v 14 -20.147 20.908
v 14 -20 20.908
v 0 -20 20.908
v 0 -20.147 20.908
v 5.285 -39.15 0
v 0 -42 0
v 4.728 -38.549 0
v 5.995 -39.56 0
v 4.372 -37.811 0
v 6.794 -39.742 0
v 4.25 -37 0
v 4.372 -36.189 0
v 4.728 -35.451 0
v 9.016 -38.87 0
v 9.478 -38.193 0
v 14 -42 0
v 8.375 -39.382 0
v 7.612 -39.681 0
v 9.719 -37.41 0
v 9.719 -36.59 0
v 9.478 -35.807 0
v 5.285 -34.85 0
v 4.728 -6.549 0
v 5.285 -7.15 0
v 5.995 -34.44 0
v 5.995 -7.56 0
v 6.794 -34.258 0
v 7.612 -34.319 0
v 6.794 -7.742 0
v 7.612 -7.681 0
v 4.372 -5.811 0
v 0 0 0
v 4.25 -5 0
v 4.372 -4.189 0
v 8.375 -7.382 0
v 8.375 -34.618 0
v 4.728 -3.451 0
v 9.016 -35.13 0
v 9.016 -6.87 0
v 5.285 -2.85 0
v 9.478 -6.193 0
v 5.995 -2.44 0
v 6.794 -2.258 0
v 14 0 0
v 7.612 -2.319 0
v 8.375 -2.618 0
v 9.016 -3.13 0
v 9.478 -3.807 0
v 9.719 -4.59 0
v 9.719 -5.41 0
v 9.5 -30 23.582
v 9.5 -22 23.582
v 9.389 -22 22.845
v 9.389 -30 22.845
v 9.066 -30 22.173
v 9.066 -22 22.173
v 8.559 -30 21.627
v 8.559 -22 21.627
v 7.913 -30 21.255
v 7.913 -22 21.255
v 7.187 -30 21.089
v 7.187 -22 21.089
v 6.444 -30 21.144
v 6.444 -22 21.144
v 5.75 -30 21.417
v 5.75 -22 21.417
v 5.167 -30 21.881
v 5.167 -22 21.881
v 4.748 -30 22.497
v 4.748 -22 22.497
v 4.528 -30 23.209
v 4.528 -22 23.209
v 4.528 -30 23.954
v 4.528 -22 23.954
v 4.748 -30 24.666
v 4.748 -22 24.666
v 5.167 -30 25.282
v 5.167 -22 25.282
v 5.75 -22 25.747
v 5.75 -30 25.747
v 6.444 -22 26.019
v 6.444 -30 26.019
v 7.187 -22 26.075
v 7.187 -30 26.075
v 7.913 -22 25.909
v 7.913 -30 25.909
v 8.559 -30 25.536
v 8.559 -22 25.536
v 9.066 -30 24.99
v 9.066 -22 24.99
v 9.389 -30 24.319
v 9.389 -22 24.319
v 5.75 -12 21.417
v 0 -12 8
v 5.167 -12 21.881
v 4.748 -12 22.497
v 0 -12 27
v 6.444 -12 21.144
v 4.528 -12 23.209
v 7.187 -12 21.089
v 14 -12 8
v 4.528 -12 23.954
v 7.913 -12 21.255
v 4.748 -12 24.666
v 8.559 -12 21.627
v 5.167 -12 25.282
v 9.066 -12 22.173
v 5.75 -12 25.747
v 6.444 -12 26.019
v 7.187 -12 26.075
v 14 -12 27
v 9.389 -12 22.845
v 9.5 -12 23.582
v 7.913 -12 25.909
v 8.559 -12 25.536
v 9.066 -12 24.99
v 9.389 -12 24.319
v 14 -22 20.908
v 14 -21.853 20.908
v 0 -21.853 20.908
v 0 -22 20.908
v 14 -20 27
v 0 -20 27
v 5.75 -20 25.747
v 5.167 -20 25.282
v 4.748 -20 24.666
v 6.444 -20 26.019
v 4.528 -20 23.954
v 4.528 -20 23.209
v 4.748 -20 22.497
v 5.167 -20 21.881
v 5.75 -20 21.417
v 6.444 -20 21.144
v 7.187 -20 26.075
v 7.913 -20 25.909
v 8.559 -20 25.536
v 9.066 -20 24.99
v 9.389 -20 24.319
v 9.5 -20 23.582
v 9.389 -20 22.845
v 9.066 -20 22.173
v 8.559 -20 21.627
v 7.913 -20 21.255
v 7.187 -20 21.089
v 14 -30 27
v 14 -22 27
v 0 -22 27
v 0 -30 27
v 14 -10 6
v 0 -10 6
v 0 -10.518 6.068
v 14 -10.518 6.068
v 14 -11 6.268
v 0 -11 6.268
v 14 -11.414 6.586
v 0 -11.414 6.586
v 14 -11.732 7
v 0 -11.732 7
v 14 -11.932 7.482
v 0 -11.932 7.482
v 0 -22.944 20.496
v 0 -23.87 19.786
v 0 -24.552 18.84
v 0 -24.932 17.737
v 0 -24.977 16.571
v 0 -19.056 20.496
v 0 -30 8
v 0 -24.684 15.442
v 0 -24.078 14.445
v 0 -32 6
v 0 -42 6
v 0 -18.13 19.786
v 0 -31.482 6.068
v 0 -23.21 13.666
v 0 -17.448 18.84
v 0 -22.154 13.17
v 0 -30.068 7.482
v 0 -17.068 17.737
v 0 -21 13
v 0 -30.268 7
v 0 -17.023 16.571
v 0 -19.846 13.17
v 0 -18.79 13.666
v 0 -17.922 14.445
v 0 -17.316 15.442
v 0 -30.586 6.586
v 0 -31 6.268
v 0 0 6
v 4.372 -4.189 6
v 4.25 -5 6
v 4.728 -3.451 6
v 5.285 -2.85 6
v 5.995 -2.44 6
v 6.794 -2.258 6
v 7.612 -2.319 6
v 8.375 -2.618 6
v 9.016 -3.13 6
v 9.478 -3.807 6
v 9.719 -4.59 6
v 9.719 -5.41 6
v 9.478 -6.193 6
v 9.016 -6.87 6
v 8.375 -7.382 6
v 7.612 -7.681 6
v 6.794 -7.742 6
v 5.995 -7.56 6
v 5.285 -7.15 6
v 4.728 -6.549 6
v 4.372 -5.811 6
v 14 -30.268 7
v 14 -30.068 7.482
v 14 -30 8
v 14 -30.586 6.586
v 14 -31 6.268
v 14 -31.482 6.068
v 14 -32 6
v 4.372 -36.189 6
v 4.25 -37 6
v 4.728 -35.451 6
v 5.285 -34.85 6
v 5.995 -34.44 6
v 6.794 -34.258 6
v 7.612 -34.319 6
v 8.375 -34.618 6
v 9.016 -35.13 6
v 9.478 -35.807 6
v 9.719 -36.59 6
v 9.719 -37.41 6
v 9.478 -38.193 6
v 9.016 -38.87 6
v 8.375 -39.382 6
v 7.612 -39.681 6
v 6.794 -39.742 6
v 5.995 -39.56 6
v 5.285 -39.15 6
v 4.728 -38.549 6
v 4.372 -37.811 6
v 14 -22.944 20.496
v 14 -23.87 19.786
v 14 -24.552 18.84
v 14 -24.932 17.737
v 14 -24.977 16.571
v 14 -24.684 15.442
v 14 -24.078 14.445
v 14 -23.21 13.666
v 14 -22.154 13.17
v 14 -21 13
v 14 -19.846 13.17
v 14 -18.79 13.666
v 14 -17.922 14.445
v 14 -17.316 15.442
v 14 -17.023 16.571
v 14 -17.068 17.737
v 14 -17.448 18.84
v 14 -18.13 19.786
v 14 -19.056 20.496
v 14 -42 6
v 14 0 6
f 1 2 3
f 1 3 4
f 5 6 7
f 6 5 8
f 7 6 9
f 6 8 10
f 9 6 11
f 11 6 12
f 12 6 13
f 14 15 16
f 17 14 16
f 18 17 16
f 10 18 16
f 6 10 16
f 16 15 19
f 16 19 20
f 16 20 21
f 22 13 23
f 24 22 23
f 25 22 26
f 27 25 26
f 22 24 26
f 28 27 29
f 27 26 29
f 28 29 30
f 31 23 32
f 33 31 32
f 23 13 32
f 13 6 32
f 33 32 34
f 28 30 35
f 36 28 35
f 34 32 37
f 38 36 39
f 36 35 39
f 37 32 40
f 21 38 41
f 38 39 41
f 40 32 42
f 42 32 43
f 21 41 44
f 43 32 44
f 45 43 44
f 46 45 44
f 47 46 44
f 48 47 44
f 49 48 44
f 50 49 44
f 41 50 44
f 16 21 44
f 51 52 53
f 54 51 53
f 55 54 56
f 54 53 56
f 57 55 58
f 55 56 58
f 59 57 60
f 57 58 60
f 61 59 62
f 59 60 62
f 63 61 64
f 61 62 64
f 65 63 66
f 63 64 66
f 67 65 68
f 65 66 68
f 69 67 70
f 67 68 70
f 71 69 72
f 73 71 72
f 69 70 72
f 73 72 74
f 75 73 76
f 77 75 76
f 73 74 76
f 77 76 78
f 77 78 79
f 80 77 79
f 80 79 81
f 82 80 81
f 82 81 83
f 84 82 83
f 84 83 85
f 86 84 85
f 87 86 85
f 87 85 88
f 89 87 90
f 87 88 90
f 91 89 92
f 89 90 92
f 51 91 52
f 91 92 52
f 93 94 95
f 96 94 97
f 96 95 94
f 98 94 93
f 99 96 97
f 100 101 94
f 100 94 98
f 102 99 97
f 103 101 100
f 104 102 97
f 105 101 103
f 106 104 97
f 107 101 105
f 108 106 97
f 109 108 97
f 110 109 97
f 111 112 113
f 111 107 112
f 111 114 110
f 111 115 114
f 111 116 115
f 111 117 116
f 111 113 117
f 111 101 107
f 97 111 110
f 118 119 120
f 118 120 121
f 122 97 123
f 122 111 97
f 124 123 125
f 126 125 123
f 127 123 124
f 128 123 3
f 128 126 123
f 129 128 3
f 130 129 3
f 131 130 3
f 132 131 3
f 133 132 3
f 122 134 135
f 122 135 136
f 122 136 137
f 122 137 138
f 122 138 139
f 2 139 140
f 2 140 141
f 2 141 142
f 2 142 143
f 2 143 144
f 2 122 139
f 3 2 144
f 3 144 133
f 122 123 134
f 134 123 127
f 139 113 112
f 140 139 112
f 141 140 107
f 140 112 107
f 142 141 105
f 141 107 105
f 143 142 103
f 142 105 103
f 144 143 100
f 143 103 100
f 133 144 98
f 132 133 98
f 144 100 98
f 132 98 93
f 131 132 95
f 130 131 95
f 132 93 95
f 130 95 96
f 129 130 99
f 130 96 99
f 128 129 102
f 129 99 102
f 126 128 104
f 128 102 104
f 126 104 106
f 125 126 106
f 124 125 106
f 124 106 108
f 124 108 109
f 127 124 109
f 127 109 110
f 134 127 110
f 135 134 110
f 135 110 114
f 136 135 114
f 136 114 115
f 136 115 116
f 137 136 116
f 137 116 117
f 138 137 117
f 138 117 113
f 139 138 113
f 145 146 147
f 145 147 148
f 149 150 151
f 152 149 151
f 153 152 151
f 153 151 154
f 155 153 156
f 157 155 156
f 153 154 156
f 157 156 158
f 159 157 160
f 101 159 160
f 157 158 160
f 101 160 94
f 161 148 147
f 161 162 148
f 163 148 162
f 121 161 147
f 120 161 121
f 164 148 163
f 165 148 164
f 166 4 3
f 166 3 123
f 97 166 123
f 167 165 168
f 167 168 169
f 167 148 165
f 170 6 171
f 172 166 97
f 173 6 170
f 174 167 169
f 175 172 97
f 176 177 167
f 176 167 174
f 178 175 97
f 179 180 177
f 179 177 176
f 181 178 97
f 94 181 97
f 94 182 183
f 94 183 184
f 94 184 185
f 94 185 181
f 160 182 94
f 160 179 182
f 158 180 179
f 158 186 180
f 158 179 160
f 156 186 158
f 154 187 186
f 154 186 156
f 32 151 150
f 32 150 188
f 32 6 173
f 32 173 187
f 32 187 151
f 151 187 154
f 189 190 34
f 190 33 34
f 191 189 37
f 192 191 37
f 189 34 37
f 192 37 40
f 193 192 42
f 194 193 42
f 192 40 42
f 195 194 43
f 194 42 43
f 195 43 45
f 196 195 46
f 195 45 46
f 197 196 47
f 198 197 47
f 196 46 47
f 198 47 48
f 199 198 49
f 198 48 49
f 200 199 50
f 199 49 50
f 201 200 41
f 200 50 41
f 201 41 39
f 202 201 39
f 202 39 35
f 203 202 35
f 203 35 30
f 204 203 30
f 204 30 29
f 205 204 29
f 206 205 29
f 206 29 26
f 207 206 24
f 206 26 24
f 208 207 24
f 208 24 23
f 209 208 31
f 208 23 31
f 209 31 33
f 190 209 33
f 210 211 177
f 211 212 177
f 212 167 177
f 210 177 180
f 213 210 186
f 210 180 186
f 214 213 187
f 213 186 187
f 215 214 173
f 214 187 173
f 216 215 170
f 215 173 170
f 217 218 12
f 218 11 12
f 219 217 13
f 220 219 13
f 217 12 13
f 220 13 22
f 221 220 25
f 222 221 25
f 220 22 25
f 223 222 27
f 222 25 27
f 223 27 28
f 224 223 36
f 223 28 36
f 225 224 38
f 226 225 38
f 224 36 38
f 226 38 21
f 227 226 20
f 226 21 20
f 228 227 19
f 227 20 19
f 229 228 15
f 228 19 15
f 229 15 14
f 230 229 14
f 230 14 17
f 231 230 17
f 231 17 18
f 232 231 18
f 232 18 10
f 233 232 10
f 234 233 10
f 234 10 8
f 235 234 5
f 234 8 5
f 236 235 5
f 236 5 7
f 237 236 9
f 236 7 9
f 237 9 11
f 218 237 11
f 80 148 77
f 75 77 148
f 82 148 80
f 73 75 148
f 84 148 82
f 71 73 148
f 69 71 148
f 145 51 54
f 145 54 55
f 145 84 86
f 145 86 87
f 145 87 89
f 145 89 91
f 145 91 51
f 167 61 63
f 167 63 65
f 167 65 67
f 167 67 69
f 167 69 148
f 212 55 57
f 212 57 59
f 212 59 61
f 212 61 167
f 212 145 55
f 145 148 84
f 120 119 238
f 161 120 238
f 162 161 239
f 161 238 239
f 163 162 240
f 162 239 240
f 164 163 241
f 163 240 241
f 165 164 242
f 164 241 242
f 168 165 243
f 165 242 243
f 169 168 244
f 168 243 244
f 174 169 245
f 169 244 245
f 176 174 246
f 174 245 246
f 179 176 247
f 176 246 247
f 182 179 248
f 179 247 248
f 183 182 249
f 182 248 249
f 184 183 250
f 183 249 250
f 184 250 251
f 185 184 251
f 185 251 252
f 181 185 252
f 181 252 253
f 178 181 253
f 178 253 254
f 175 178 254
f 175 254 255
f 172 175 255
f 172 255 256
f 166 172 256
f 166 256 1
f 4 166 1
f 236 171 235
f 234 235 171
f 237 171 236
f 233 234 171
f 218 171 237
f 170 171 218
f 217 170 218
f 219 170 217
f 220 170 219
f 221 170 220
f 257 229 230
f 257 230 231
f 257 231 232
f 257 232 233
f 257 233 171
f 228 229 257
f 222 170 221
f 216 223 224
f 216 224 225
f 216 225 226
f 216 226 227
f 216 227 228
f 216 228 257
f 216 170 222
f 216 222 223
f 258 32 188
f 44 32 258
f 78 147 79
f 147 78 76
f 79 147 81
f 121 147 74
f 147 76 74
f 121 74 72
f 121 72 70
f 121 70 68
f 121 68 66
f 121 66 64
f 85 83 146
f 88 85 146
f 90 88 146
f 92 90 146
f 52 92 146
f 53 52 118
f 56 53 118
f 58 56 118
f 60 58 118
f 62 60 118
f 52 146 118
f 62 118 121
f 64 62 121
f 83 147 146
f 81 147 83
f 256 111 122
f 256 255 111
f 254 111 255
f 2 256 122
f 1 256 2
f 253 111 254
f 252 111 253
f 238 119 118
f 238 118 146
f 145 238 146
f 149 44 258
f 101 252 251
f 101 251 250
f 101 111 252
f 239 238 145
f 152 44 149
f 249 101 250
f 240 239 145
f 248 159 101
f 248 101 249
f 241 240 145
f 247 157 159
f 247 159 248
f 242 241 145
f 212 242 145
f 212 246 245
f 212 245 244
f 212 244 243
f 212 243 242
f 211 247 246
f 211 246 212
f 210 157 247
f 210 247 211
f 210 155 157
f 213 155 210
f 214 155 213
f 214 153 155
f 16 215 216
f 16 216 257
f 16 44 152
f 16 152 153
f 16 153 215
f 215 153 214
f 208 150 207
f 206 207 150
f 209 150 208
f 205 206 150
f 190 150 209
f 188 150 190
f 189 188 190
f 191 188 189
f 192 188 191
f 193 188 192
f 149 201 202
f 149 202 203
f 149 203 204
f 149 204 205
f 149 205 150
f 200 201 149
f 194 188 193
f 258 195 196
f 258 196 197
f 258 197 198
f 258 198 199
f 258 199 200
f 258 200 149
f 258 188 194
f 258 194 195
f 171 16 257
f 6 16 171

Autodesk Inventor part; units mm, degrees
ref_plane "YZ Plane" through (0, 0, 0) normal (1, 0, 0) x (0, 1, 0)
ref_plane "XZ Plane" through (0, 0, 0) normal (0, 1, 0) x (-1, 0, 0)
ref_plane "XY Plane" through (0, 0, 0) normal (0, 0, 1) x (1, 0, 0)
sketch "Sketch1" plane through (0, 0, 0) normal (0, 0, 1) x (1, 0, 0)
  line L0 (0, 0) -> (14, 0)
  line L1 (14, 0) -> (14, -42)
  line L2 (14, -42) -> (0, -42)
  line L3 (0, -42) -> (0, 0)
  dimension "d0" = 14
  dimension "d1" = 42
extrude "Extrusion1" add sketch "Sketch1" along normal blind 6
sketch "Sketch2" plane through (14, -42, 0) normal (1, 0, 0) x (0, 0, -1)
  line L0 (-6, 30) -> (-27, 30)
  line L1 (-27, 30) -> (-27, 12)
  line L2 (-27, 12) -> (-6, 12)
  line L3 (-6, 12) -> (-6, 30)
  point P0 (0, 42)
  point P1 (-6, 0)
  point P2 (-6, 42)
extrude "Extrusion2" add sketch "Sketch2" against normal blind 14
sketch "Sketch3" plane through (14, -42, 0) normal (1, 0, 0) x (0, 0, -1)
  line L0 (0, 42) -> (0, 0) projected
  line L1 (-27, 30) -> (-6, 30) projected
  circle A0 centre (-17, 21) radius 4
  dimension "d11" = 8
extrude "Extrusion3" cut sketch "Sketch3" against normal blind 14
sketch "Sketch4" plane through (14, -42, 0) normal (1, 0, 0) x (0, 0, -1)
  point P0 (0, 42)
sketch "Sketch5" plane through (14, -42, 0) normal (1, 0, 0) x (0, 0, -1)
  point P0 (0, 42)
sketch "Sketch6" plane through (0, 0, 0) normal (0, 0, -1) x (-1, 0, 0)
  line L0 (0, -42) -> (-14, -42) projected
  circle A0 centre (-7, -5) radius 2.75
  circle A1 centre (-7, -37) radius 2.75
  point P0 (-14, 0)
  dimension "d16" = 5.5
  dimension "d17" = 5.5
extrude "Extrusion4" cut sketch "Sketch6" against normal blind 6
sketch "Sketch7" plane through (14, -42, 0) normal (1, 0, 0) x (0, 0, -1)
  point P0 (0, 42)
sketch "Sketch8" plane through (14, -42, 0) normal (1, 0, 0) x (0, 0, -1)
  line L0 (-27, 30) -> (-27, 12) projected
  line L1 (-27, 21) -> (-27, 22)
  line L2 (-27, 21) -> (-27, 20)
  line L3 (-27, 20) -> (-20.908, 20)
  line L4 (-27, 22) -> (-20.908, 22)
  line L5 (-20.908, 22) -> (-20.908, 20)
  point P0 (0, 42)
  dimension "d21" = 1
extrude "Extrusion5" cut sketch "Sketch8" against normal blind 14
sketch "Sketch9" plane through (14, -12, 27) normal (0, 1, 0) x (1, 0, 0)
  line L0 (0, 0) -> (-14, 0) projected
  line L1 (0, 21) -> (-14, 21) projected
  line L2 (-14, 0) -> (-14, 6.092) projected
  circle A0 centre (-7, 3.4183) radius 2.5
  point P0 (-14, 27)
  dimension "d24" = 5
extrude "Extrusion6" cut sketch "Sketch9" against normal blind 20
fillet "Fillet1" radius 2 1 edges at (7, -12, 6)
fillet "Fillet2" radius 2 1 edges at (7, -30, 6)
properties part number "soporte de eje de carril"
